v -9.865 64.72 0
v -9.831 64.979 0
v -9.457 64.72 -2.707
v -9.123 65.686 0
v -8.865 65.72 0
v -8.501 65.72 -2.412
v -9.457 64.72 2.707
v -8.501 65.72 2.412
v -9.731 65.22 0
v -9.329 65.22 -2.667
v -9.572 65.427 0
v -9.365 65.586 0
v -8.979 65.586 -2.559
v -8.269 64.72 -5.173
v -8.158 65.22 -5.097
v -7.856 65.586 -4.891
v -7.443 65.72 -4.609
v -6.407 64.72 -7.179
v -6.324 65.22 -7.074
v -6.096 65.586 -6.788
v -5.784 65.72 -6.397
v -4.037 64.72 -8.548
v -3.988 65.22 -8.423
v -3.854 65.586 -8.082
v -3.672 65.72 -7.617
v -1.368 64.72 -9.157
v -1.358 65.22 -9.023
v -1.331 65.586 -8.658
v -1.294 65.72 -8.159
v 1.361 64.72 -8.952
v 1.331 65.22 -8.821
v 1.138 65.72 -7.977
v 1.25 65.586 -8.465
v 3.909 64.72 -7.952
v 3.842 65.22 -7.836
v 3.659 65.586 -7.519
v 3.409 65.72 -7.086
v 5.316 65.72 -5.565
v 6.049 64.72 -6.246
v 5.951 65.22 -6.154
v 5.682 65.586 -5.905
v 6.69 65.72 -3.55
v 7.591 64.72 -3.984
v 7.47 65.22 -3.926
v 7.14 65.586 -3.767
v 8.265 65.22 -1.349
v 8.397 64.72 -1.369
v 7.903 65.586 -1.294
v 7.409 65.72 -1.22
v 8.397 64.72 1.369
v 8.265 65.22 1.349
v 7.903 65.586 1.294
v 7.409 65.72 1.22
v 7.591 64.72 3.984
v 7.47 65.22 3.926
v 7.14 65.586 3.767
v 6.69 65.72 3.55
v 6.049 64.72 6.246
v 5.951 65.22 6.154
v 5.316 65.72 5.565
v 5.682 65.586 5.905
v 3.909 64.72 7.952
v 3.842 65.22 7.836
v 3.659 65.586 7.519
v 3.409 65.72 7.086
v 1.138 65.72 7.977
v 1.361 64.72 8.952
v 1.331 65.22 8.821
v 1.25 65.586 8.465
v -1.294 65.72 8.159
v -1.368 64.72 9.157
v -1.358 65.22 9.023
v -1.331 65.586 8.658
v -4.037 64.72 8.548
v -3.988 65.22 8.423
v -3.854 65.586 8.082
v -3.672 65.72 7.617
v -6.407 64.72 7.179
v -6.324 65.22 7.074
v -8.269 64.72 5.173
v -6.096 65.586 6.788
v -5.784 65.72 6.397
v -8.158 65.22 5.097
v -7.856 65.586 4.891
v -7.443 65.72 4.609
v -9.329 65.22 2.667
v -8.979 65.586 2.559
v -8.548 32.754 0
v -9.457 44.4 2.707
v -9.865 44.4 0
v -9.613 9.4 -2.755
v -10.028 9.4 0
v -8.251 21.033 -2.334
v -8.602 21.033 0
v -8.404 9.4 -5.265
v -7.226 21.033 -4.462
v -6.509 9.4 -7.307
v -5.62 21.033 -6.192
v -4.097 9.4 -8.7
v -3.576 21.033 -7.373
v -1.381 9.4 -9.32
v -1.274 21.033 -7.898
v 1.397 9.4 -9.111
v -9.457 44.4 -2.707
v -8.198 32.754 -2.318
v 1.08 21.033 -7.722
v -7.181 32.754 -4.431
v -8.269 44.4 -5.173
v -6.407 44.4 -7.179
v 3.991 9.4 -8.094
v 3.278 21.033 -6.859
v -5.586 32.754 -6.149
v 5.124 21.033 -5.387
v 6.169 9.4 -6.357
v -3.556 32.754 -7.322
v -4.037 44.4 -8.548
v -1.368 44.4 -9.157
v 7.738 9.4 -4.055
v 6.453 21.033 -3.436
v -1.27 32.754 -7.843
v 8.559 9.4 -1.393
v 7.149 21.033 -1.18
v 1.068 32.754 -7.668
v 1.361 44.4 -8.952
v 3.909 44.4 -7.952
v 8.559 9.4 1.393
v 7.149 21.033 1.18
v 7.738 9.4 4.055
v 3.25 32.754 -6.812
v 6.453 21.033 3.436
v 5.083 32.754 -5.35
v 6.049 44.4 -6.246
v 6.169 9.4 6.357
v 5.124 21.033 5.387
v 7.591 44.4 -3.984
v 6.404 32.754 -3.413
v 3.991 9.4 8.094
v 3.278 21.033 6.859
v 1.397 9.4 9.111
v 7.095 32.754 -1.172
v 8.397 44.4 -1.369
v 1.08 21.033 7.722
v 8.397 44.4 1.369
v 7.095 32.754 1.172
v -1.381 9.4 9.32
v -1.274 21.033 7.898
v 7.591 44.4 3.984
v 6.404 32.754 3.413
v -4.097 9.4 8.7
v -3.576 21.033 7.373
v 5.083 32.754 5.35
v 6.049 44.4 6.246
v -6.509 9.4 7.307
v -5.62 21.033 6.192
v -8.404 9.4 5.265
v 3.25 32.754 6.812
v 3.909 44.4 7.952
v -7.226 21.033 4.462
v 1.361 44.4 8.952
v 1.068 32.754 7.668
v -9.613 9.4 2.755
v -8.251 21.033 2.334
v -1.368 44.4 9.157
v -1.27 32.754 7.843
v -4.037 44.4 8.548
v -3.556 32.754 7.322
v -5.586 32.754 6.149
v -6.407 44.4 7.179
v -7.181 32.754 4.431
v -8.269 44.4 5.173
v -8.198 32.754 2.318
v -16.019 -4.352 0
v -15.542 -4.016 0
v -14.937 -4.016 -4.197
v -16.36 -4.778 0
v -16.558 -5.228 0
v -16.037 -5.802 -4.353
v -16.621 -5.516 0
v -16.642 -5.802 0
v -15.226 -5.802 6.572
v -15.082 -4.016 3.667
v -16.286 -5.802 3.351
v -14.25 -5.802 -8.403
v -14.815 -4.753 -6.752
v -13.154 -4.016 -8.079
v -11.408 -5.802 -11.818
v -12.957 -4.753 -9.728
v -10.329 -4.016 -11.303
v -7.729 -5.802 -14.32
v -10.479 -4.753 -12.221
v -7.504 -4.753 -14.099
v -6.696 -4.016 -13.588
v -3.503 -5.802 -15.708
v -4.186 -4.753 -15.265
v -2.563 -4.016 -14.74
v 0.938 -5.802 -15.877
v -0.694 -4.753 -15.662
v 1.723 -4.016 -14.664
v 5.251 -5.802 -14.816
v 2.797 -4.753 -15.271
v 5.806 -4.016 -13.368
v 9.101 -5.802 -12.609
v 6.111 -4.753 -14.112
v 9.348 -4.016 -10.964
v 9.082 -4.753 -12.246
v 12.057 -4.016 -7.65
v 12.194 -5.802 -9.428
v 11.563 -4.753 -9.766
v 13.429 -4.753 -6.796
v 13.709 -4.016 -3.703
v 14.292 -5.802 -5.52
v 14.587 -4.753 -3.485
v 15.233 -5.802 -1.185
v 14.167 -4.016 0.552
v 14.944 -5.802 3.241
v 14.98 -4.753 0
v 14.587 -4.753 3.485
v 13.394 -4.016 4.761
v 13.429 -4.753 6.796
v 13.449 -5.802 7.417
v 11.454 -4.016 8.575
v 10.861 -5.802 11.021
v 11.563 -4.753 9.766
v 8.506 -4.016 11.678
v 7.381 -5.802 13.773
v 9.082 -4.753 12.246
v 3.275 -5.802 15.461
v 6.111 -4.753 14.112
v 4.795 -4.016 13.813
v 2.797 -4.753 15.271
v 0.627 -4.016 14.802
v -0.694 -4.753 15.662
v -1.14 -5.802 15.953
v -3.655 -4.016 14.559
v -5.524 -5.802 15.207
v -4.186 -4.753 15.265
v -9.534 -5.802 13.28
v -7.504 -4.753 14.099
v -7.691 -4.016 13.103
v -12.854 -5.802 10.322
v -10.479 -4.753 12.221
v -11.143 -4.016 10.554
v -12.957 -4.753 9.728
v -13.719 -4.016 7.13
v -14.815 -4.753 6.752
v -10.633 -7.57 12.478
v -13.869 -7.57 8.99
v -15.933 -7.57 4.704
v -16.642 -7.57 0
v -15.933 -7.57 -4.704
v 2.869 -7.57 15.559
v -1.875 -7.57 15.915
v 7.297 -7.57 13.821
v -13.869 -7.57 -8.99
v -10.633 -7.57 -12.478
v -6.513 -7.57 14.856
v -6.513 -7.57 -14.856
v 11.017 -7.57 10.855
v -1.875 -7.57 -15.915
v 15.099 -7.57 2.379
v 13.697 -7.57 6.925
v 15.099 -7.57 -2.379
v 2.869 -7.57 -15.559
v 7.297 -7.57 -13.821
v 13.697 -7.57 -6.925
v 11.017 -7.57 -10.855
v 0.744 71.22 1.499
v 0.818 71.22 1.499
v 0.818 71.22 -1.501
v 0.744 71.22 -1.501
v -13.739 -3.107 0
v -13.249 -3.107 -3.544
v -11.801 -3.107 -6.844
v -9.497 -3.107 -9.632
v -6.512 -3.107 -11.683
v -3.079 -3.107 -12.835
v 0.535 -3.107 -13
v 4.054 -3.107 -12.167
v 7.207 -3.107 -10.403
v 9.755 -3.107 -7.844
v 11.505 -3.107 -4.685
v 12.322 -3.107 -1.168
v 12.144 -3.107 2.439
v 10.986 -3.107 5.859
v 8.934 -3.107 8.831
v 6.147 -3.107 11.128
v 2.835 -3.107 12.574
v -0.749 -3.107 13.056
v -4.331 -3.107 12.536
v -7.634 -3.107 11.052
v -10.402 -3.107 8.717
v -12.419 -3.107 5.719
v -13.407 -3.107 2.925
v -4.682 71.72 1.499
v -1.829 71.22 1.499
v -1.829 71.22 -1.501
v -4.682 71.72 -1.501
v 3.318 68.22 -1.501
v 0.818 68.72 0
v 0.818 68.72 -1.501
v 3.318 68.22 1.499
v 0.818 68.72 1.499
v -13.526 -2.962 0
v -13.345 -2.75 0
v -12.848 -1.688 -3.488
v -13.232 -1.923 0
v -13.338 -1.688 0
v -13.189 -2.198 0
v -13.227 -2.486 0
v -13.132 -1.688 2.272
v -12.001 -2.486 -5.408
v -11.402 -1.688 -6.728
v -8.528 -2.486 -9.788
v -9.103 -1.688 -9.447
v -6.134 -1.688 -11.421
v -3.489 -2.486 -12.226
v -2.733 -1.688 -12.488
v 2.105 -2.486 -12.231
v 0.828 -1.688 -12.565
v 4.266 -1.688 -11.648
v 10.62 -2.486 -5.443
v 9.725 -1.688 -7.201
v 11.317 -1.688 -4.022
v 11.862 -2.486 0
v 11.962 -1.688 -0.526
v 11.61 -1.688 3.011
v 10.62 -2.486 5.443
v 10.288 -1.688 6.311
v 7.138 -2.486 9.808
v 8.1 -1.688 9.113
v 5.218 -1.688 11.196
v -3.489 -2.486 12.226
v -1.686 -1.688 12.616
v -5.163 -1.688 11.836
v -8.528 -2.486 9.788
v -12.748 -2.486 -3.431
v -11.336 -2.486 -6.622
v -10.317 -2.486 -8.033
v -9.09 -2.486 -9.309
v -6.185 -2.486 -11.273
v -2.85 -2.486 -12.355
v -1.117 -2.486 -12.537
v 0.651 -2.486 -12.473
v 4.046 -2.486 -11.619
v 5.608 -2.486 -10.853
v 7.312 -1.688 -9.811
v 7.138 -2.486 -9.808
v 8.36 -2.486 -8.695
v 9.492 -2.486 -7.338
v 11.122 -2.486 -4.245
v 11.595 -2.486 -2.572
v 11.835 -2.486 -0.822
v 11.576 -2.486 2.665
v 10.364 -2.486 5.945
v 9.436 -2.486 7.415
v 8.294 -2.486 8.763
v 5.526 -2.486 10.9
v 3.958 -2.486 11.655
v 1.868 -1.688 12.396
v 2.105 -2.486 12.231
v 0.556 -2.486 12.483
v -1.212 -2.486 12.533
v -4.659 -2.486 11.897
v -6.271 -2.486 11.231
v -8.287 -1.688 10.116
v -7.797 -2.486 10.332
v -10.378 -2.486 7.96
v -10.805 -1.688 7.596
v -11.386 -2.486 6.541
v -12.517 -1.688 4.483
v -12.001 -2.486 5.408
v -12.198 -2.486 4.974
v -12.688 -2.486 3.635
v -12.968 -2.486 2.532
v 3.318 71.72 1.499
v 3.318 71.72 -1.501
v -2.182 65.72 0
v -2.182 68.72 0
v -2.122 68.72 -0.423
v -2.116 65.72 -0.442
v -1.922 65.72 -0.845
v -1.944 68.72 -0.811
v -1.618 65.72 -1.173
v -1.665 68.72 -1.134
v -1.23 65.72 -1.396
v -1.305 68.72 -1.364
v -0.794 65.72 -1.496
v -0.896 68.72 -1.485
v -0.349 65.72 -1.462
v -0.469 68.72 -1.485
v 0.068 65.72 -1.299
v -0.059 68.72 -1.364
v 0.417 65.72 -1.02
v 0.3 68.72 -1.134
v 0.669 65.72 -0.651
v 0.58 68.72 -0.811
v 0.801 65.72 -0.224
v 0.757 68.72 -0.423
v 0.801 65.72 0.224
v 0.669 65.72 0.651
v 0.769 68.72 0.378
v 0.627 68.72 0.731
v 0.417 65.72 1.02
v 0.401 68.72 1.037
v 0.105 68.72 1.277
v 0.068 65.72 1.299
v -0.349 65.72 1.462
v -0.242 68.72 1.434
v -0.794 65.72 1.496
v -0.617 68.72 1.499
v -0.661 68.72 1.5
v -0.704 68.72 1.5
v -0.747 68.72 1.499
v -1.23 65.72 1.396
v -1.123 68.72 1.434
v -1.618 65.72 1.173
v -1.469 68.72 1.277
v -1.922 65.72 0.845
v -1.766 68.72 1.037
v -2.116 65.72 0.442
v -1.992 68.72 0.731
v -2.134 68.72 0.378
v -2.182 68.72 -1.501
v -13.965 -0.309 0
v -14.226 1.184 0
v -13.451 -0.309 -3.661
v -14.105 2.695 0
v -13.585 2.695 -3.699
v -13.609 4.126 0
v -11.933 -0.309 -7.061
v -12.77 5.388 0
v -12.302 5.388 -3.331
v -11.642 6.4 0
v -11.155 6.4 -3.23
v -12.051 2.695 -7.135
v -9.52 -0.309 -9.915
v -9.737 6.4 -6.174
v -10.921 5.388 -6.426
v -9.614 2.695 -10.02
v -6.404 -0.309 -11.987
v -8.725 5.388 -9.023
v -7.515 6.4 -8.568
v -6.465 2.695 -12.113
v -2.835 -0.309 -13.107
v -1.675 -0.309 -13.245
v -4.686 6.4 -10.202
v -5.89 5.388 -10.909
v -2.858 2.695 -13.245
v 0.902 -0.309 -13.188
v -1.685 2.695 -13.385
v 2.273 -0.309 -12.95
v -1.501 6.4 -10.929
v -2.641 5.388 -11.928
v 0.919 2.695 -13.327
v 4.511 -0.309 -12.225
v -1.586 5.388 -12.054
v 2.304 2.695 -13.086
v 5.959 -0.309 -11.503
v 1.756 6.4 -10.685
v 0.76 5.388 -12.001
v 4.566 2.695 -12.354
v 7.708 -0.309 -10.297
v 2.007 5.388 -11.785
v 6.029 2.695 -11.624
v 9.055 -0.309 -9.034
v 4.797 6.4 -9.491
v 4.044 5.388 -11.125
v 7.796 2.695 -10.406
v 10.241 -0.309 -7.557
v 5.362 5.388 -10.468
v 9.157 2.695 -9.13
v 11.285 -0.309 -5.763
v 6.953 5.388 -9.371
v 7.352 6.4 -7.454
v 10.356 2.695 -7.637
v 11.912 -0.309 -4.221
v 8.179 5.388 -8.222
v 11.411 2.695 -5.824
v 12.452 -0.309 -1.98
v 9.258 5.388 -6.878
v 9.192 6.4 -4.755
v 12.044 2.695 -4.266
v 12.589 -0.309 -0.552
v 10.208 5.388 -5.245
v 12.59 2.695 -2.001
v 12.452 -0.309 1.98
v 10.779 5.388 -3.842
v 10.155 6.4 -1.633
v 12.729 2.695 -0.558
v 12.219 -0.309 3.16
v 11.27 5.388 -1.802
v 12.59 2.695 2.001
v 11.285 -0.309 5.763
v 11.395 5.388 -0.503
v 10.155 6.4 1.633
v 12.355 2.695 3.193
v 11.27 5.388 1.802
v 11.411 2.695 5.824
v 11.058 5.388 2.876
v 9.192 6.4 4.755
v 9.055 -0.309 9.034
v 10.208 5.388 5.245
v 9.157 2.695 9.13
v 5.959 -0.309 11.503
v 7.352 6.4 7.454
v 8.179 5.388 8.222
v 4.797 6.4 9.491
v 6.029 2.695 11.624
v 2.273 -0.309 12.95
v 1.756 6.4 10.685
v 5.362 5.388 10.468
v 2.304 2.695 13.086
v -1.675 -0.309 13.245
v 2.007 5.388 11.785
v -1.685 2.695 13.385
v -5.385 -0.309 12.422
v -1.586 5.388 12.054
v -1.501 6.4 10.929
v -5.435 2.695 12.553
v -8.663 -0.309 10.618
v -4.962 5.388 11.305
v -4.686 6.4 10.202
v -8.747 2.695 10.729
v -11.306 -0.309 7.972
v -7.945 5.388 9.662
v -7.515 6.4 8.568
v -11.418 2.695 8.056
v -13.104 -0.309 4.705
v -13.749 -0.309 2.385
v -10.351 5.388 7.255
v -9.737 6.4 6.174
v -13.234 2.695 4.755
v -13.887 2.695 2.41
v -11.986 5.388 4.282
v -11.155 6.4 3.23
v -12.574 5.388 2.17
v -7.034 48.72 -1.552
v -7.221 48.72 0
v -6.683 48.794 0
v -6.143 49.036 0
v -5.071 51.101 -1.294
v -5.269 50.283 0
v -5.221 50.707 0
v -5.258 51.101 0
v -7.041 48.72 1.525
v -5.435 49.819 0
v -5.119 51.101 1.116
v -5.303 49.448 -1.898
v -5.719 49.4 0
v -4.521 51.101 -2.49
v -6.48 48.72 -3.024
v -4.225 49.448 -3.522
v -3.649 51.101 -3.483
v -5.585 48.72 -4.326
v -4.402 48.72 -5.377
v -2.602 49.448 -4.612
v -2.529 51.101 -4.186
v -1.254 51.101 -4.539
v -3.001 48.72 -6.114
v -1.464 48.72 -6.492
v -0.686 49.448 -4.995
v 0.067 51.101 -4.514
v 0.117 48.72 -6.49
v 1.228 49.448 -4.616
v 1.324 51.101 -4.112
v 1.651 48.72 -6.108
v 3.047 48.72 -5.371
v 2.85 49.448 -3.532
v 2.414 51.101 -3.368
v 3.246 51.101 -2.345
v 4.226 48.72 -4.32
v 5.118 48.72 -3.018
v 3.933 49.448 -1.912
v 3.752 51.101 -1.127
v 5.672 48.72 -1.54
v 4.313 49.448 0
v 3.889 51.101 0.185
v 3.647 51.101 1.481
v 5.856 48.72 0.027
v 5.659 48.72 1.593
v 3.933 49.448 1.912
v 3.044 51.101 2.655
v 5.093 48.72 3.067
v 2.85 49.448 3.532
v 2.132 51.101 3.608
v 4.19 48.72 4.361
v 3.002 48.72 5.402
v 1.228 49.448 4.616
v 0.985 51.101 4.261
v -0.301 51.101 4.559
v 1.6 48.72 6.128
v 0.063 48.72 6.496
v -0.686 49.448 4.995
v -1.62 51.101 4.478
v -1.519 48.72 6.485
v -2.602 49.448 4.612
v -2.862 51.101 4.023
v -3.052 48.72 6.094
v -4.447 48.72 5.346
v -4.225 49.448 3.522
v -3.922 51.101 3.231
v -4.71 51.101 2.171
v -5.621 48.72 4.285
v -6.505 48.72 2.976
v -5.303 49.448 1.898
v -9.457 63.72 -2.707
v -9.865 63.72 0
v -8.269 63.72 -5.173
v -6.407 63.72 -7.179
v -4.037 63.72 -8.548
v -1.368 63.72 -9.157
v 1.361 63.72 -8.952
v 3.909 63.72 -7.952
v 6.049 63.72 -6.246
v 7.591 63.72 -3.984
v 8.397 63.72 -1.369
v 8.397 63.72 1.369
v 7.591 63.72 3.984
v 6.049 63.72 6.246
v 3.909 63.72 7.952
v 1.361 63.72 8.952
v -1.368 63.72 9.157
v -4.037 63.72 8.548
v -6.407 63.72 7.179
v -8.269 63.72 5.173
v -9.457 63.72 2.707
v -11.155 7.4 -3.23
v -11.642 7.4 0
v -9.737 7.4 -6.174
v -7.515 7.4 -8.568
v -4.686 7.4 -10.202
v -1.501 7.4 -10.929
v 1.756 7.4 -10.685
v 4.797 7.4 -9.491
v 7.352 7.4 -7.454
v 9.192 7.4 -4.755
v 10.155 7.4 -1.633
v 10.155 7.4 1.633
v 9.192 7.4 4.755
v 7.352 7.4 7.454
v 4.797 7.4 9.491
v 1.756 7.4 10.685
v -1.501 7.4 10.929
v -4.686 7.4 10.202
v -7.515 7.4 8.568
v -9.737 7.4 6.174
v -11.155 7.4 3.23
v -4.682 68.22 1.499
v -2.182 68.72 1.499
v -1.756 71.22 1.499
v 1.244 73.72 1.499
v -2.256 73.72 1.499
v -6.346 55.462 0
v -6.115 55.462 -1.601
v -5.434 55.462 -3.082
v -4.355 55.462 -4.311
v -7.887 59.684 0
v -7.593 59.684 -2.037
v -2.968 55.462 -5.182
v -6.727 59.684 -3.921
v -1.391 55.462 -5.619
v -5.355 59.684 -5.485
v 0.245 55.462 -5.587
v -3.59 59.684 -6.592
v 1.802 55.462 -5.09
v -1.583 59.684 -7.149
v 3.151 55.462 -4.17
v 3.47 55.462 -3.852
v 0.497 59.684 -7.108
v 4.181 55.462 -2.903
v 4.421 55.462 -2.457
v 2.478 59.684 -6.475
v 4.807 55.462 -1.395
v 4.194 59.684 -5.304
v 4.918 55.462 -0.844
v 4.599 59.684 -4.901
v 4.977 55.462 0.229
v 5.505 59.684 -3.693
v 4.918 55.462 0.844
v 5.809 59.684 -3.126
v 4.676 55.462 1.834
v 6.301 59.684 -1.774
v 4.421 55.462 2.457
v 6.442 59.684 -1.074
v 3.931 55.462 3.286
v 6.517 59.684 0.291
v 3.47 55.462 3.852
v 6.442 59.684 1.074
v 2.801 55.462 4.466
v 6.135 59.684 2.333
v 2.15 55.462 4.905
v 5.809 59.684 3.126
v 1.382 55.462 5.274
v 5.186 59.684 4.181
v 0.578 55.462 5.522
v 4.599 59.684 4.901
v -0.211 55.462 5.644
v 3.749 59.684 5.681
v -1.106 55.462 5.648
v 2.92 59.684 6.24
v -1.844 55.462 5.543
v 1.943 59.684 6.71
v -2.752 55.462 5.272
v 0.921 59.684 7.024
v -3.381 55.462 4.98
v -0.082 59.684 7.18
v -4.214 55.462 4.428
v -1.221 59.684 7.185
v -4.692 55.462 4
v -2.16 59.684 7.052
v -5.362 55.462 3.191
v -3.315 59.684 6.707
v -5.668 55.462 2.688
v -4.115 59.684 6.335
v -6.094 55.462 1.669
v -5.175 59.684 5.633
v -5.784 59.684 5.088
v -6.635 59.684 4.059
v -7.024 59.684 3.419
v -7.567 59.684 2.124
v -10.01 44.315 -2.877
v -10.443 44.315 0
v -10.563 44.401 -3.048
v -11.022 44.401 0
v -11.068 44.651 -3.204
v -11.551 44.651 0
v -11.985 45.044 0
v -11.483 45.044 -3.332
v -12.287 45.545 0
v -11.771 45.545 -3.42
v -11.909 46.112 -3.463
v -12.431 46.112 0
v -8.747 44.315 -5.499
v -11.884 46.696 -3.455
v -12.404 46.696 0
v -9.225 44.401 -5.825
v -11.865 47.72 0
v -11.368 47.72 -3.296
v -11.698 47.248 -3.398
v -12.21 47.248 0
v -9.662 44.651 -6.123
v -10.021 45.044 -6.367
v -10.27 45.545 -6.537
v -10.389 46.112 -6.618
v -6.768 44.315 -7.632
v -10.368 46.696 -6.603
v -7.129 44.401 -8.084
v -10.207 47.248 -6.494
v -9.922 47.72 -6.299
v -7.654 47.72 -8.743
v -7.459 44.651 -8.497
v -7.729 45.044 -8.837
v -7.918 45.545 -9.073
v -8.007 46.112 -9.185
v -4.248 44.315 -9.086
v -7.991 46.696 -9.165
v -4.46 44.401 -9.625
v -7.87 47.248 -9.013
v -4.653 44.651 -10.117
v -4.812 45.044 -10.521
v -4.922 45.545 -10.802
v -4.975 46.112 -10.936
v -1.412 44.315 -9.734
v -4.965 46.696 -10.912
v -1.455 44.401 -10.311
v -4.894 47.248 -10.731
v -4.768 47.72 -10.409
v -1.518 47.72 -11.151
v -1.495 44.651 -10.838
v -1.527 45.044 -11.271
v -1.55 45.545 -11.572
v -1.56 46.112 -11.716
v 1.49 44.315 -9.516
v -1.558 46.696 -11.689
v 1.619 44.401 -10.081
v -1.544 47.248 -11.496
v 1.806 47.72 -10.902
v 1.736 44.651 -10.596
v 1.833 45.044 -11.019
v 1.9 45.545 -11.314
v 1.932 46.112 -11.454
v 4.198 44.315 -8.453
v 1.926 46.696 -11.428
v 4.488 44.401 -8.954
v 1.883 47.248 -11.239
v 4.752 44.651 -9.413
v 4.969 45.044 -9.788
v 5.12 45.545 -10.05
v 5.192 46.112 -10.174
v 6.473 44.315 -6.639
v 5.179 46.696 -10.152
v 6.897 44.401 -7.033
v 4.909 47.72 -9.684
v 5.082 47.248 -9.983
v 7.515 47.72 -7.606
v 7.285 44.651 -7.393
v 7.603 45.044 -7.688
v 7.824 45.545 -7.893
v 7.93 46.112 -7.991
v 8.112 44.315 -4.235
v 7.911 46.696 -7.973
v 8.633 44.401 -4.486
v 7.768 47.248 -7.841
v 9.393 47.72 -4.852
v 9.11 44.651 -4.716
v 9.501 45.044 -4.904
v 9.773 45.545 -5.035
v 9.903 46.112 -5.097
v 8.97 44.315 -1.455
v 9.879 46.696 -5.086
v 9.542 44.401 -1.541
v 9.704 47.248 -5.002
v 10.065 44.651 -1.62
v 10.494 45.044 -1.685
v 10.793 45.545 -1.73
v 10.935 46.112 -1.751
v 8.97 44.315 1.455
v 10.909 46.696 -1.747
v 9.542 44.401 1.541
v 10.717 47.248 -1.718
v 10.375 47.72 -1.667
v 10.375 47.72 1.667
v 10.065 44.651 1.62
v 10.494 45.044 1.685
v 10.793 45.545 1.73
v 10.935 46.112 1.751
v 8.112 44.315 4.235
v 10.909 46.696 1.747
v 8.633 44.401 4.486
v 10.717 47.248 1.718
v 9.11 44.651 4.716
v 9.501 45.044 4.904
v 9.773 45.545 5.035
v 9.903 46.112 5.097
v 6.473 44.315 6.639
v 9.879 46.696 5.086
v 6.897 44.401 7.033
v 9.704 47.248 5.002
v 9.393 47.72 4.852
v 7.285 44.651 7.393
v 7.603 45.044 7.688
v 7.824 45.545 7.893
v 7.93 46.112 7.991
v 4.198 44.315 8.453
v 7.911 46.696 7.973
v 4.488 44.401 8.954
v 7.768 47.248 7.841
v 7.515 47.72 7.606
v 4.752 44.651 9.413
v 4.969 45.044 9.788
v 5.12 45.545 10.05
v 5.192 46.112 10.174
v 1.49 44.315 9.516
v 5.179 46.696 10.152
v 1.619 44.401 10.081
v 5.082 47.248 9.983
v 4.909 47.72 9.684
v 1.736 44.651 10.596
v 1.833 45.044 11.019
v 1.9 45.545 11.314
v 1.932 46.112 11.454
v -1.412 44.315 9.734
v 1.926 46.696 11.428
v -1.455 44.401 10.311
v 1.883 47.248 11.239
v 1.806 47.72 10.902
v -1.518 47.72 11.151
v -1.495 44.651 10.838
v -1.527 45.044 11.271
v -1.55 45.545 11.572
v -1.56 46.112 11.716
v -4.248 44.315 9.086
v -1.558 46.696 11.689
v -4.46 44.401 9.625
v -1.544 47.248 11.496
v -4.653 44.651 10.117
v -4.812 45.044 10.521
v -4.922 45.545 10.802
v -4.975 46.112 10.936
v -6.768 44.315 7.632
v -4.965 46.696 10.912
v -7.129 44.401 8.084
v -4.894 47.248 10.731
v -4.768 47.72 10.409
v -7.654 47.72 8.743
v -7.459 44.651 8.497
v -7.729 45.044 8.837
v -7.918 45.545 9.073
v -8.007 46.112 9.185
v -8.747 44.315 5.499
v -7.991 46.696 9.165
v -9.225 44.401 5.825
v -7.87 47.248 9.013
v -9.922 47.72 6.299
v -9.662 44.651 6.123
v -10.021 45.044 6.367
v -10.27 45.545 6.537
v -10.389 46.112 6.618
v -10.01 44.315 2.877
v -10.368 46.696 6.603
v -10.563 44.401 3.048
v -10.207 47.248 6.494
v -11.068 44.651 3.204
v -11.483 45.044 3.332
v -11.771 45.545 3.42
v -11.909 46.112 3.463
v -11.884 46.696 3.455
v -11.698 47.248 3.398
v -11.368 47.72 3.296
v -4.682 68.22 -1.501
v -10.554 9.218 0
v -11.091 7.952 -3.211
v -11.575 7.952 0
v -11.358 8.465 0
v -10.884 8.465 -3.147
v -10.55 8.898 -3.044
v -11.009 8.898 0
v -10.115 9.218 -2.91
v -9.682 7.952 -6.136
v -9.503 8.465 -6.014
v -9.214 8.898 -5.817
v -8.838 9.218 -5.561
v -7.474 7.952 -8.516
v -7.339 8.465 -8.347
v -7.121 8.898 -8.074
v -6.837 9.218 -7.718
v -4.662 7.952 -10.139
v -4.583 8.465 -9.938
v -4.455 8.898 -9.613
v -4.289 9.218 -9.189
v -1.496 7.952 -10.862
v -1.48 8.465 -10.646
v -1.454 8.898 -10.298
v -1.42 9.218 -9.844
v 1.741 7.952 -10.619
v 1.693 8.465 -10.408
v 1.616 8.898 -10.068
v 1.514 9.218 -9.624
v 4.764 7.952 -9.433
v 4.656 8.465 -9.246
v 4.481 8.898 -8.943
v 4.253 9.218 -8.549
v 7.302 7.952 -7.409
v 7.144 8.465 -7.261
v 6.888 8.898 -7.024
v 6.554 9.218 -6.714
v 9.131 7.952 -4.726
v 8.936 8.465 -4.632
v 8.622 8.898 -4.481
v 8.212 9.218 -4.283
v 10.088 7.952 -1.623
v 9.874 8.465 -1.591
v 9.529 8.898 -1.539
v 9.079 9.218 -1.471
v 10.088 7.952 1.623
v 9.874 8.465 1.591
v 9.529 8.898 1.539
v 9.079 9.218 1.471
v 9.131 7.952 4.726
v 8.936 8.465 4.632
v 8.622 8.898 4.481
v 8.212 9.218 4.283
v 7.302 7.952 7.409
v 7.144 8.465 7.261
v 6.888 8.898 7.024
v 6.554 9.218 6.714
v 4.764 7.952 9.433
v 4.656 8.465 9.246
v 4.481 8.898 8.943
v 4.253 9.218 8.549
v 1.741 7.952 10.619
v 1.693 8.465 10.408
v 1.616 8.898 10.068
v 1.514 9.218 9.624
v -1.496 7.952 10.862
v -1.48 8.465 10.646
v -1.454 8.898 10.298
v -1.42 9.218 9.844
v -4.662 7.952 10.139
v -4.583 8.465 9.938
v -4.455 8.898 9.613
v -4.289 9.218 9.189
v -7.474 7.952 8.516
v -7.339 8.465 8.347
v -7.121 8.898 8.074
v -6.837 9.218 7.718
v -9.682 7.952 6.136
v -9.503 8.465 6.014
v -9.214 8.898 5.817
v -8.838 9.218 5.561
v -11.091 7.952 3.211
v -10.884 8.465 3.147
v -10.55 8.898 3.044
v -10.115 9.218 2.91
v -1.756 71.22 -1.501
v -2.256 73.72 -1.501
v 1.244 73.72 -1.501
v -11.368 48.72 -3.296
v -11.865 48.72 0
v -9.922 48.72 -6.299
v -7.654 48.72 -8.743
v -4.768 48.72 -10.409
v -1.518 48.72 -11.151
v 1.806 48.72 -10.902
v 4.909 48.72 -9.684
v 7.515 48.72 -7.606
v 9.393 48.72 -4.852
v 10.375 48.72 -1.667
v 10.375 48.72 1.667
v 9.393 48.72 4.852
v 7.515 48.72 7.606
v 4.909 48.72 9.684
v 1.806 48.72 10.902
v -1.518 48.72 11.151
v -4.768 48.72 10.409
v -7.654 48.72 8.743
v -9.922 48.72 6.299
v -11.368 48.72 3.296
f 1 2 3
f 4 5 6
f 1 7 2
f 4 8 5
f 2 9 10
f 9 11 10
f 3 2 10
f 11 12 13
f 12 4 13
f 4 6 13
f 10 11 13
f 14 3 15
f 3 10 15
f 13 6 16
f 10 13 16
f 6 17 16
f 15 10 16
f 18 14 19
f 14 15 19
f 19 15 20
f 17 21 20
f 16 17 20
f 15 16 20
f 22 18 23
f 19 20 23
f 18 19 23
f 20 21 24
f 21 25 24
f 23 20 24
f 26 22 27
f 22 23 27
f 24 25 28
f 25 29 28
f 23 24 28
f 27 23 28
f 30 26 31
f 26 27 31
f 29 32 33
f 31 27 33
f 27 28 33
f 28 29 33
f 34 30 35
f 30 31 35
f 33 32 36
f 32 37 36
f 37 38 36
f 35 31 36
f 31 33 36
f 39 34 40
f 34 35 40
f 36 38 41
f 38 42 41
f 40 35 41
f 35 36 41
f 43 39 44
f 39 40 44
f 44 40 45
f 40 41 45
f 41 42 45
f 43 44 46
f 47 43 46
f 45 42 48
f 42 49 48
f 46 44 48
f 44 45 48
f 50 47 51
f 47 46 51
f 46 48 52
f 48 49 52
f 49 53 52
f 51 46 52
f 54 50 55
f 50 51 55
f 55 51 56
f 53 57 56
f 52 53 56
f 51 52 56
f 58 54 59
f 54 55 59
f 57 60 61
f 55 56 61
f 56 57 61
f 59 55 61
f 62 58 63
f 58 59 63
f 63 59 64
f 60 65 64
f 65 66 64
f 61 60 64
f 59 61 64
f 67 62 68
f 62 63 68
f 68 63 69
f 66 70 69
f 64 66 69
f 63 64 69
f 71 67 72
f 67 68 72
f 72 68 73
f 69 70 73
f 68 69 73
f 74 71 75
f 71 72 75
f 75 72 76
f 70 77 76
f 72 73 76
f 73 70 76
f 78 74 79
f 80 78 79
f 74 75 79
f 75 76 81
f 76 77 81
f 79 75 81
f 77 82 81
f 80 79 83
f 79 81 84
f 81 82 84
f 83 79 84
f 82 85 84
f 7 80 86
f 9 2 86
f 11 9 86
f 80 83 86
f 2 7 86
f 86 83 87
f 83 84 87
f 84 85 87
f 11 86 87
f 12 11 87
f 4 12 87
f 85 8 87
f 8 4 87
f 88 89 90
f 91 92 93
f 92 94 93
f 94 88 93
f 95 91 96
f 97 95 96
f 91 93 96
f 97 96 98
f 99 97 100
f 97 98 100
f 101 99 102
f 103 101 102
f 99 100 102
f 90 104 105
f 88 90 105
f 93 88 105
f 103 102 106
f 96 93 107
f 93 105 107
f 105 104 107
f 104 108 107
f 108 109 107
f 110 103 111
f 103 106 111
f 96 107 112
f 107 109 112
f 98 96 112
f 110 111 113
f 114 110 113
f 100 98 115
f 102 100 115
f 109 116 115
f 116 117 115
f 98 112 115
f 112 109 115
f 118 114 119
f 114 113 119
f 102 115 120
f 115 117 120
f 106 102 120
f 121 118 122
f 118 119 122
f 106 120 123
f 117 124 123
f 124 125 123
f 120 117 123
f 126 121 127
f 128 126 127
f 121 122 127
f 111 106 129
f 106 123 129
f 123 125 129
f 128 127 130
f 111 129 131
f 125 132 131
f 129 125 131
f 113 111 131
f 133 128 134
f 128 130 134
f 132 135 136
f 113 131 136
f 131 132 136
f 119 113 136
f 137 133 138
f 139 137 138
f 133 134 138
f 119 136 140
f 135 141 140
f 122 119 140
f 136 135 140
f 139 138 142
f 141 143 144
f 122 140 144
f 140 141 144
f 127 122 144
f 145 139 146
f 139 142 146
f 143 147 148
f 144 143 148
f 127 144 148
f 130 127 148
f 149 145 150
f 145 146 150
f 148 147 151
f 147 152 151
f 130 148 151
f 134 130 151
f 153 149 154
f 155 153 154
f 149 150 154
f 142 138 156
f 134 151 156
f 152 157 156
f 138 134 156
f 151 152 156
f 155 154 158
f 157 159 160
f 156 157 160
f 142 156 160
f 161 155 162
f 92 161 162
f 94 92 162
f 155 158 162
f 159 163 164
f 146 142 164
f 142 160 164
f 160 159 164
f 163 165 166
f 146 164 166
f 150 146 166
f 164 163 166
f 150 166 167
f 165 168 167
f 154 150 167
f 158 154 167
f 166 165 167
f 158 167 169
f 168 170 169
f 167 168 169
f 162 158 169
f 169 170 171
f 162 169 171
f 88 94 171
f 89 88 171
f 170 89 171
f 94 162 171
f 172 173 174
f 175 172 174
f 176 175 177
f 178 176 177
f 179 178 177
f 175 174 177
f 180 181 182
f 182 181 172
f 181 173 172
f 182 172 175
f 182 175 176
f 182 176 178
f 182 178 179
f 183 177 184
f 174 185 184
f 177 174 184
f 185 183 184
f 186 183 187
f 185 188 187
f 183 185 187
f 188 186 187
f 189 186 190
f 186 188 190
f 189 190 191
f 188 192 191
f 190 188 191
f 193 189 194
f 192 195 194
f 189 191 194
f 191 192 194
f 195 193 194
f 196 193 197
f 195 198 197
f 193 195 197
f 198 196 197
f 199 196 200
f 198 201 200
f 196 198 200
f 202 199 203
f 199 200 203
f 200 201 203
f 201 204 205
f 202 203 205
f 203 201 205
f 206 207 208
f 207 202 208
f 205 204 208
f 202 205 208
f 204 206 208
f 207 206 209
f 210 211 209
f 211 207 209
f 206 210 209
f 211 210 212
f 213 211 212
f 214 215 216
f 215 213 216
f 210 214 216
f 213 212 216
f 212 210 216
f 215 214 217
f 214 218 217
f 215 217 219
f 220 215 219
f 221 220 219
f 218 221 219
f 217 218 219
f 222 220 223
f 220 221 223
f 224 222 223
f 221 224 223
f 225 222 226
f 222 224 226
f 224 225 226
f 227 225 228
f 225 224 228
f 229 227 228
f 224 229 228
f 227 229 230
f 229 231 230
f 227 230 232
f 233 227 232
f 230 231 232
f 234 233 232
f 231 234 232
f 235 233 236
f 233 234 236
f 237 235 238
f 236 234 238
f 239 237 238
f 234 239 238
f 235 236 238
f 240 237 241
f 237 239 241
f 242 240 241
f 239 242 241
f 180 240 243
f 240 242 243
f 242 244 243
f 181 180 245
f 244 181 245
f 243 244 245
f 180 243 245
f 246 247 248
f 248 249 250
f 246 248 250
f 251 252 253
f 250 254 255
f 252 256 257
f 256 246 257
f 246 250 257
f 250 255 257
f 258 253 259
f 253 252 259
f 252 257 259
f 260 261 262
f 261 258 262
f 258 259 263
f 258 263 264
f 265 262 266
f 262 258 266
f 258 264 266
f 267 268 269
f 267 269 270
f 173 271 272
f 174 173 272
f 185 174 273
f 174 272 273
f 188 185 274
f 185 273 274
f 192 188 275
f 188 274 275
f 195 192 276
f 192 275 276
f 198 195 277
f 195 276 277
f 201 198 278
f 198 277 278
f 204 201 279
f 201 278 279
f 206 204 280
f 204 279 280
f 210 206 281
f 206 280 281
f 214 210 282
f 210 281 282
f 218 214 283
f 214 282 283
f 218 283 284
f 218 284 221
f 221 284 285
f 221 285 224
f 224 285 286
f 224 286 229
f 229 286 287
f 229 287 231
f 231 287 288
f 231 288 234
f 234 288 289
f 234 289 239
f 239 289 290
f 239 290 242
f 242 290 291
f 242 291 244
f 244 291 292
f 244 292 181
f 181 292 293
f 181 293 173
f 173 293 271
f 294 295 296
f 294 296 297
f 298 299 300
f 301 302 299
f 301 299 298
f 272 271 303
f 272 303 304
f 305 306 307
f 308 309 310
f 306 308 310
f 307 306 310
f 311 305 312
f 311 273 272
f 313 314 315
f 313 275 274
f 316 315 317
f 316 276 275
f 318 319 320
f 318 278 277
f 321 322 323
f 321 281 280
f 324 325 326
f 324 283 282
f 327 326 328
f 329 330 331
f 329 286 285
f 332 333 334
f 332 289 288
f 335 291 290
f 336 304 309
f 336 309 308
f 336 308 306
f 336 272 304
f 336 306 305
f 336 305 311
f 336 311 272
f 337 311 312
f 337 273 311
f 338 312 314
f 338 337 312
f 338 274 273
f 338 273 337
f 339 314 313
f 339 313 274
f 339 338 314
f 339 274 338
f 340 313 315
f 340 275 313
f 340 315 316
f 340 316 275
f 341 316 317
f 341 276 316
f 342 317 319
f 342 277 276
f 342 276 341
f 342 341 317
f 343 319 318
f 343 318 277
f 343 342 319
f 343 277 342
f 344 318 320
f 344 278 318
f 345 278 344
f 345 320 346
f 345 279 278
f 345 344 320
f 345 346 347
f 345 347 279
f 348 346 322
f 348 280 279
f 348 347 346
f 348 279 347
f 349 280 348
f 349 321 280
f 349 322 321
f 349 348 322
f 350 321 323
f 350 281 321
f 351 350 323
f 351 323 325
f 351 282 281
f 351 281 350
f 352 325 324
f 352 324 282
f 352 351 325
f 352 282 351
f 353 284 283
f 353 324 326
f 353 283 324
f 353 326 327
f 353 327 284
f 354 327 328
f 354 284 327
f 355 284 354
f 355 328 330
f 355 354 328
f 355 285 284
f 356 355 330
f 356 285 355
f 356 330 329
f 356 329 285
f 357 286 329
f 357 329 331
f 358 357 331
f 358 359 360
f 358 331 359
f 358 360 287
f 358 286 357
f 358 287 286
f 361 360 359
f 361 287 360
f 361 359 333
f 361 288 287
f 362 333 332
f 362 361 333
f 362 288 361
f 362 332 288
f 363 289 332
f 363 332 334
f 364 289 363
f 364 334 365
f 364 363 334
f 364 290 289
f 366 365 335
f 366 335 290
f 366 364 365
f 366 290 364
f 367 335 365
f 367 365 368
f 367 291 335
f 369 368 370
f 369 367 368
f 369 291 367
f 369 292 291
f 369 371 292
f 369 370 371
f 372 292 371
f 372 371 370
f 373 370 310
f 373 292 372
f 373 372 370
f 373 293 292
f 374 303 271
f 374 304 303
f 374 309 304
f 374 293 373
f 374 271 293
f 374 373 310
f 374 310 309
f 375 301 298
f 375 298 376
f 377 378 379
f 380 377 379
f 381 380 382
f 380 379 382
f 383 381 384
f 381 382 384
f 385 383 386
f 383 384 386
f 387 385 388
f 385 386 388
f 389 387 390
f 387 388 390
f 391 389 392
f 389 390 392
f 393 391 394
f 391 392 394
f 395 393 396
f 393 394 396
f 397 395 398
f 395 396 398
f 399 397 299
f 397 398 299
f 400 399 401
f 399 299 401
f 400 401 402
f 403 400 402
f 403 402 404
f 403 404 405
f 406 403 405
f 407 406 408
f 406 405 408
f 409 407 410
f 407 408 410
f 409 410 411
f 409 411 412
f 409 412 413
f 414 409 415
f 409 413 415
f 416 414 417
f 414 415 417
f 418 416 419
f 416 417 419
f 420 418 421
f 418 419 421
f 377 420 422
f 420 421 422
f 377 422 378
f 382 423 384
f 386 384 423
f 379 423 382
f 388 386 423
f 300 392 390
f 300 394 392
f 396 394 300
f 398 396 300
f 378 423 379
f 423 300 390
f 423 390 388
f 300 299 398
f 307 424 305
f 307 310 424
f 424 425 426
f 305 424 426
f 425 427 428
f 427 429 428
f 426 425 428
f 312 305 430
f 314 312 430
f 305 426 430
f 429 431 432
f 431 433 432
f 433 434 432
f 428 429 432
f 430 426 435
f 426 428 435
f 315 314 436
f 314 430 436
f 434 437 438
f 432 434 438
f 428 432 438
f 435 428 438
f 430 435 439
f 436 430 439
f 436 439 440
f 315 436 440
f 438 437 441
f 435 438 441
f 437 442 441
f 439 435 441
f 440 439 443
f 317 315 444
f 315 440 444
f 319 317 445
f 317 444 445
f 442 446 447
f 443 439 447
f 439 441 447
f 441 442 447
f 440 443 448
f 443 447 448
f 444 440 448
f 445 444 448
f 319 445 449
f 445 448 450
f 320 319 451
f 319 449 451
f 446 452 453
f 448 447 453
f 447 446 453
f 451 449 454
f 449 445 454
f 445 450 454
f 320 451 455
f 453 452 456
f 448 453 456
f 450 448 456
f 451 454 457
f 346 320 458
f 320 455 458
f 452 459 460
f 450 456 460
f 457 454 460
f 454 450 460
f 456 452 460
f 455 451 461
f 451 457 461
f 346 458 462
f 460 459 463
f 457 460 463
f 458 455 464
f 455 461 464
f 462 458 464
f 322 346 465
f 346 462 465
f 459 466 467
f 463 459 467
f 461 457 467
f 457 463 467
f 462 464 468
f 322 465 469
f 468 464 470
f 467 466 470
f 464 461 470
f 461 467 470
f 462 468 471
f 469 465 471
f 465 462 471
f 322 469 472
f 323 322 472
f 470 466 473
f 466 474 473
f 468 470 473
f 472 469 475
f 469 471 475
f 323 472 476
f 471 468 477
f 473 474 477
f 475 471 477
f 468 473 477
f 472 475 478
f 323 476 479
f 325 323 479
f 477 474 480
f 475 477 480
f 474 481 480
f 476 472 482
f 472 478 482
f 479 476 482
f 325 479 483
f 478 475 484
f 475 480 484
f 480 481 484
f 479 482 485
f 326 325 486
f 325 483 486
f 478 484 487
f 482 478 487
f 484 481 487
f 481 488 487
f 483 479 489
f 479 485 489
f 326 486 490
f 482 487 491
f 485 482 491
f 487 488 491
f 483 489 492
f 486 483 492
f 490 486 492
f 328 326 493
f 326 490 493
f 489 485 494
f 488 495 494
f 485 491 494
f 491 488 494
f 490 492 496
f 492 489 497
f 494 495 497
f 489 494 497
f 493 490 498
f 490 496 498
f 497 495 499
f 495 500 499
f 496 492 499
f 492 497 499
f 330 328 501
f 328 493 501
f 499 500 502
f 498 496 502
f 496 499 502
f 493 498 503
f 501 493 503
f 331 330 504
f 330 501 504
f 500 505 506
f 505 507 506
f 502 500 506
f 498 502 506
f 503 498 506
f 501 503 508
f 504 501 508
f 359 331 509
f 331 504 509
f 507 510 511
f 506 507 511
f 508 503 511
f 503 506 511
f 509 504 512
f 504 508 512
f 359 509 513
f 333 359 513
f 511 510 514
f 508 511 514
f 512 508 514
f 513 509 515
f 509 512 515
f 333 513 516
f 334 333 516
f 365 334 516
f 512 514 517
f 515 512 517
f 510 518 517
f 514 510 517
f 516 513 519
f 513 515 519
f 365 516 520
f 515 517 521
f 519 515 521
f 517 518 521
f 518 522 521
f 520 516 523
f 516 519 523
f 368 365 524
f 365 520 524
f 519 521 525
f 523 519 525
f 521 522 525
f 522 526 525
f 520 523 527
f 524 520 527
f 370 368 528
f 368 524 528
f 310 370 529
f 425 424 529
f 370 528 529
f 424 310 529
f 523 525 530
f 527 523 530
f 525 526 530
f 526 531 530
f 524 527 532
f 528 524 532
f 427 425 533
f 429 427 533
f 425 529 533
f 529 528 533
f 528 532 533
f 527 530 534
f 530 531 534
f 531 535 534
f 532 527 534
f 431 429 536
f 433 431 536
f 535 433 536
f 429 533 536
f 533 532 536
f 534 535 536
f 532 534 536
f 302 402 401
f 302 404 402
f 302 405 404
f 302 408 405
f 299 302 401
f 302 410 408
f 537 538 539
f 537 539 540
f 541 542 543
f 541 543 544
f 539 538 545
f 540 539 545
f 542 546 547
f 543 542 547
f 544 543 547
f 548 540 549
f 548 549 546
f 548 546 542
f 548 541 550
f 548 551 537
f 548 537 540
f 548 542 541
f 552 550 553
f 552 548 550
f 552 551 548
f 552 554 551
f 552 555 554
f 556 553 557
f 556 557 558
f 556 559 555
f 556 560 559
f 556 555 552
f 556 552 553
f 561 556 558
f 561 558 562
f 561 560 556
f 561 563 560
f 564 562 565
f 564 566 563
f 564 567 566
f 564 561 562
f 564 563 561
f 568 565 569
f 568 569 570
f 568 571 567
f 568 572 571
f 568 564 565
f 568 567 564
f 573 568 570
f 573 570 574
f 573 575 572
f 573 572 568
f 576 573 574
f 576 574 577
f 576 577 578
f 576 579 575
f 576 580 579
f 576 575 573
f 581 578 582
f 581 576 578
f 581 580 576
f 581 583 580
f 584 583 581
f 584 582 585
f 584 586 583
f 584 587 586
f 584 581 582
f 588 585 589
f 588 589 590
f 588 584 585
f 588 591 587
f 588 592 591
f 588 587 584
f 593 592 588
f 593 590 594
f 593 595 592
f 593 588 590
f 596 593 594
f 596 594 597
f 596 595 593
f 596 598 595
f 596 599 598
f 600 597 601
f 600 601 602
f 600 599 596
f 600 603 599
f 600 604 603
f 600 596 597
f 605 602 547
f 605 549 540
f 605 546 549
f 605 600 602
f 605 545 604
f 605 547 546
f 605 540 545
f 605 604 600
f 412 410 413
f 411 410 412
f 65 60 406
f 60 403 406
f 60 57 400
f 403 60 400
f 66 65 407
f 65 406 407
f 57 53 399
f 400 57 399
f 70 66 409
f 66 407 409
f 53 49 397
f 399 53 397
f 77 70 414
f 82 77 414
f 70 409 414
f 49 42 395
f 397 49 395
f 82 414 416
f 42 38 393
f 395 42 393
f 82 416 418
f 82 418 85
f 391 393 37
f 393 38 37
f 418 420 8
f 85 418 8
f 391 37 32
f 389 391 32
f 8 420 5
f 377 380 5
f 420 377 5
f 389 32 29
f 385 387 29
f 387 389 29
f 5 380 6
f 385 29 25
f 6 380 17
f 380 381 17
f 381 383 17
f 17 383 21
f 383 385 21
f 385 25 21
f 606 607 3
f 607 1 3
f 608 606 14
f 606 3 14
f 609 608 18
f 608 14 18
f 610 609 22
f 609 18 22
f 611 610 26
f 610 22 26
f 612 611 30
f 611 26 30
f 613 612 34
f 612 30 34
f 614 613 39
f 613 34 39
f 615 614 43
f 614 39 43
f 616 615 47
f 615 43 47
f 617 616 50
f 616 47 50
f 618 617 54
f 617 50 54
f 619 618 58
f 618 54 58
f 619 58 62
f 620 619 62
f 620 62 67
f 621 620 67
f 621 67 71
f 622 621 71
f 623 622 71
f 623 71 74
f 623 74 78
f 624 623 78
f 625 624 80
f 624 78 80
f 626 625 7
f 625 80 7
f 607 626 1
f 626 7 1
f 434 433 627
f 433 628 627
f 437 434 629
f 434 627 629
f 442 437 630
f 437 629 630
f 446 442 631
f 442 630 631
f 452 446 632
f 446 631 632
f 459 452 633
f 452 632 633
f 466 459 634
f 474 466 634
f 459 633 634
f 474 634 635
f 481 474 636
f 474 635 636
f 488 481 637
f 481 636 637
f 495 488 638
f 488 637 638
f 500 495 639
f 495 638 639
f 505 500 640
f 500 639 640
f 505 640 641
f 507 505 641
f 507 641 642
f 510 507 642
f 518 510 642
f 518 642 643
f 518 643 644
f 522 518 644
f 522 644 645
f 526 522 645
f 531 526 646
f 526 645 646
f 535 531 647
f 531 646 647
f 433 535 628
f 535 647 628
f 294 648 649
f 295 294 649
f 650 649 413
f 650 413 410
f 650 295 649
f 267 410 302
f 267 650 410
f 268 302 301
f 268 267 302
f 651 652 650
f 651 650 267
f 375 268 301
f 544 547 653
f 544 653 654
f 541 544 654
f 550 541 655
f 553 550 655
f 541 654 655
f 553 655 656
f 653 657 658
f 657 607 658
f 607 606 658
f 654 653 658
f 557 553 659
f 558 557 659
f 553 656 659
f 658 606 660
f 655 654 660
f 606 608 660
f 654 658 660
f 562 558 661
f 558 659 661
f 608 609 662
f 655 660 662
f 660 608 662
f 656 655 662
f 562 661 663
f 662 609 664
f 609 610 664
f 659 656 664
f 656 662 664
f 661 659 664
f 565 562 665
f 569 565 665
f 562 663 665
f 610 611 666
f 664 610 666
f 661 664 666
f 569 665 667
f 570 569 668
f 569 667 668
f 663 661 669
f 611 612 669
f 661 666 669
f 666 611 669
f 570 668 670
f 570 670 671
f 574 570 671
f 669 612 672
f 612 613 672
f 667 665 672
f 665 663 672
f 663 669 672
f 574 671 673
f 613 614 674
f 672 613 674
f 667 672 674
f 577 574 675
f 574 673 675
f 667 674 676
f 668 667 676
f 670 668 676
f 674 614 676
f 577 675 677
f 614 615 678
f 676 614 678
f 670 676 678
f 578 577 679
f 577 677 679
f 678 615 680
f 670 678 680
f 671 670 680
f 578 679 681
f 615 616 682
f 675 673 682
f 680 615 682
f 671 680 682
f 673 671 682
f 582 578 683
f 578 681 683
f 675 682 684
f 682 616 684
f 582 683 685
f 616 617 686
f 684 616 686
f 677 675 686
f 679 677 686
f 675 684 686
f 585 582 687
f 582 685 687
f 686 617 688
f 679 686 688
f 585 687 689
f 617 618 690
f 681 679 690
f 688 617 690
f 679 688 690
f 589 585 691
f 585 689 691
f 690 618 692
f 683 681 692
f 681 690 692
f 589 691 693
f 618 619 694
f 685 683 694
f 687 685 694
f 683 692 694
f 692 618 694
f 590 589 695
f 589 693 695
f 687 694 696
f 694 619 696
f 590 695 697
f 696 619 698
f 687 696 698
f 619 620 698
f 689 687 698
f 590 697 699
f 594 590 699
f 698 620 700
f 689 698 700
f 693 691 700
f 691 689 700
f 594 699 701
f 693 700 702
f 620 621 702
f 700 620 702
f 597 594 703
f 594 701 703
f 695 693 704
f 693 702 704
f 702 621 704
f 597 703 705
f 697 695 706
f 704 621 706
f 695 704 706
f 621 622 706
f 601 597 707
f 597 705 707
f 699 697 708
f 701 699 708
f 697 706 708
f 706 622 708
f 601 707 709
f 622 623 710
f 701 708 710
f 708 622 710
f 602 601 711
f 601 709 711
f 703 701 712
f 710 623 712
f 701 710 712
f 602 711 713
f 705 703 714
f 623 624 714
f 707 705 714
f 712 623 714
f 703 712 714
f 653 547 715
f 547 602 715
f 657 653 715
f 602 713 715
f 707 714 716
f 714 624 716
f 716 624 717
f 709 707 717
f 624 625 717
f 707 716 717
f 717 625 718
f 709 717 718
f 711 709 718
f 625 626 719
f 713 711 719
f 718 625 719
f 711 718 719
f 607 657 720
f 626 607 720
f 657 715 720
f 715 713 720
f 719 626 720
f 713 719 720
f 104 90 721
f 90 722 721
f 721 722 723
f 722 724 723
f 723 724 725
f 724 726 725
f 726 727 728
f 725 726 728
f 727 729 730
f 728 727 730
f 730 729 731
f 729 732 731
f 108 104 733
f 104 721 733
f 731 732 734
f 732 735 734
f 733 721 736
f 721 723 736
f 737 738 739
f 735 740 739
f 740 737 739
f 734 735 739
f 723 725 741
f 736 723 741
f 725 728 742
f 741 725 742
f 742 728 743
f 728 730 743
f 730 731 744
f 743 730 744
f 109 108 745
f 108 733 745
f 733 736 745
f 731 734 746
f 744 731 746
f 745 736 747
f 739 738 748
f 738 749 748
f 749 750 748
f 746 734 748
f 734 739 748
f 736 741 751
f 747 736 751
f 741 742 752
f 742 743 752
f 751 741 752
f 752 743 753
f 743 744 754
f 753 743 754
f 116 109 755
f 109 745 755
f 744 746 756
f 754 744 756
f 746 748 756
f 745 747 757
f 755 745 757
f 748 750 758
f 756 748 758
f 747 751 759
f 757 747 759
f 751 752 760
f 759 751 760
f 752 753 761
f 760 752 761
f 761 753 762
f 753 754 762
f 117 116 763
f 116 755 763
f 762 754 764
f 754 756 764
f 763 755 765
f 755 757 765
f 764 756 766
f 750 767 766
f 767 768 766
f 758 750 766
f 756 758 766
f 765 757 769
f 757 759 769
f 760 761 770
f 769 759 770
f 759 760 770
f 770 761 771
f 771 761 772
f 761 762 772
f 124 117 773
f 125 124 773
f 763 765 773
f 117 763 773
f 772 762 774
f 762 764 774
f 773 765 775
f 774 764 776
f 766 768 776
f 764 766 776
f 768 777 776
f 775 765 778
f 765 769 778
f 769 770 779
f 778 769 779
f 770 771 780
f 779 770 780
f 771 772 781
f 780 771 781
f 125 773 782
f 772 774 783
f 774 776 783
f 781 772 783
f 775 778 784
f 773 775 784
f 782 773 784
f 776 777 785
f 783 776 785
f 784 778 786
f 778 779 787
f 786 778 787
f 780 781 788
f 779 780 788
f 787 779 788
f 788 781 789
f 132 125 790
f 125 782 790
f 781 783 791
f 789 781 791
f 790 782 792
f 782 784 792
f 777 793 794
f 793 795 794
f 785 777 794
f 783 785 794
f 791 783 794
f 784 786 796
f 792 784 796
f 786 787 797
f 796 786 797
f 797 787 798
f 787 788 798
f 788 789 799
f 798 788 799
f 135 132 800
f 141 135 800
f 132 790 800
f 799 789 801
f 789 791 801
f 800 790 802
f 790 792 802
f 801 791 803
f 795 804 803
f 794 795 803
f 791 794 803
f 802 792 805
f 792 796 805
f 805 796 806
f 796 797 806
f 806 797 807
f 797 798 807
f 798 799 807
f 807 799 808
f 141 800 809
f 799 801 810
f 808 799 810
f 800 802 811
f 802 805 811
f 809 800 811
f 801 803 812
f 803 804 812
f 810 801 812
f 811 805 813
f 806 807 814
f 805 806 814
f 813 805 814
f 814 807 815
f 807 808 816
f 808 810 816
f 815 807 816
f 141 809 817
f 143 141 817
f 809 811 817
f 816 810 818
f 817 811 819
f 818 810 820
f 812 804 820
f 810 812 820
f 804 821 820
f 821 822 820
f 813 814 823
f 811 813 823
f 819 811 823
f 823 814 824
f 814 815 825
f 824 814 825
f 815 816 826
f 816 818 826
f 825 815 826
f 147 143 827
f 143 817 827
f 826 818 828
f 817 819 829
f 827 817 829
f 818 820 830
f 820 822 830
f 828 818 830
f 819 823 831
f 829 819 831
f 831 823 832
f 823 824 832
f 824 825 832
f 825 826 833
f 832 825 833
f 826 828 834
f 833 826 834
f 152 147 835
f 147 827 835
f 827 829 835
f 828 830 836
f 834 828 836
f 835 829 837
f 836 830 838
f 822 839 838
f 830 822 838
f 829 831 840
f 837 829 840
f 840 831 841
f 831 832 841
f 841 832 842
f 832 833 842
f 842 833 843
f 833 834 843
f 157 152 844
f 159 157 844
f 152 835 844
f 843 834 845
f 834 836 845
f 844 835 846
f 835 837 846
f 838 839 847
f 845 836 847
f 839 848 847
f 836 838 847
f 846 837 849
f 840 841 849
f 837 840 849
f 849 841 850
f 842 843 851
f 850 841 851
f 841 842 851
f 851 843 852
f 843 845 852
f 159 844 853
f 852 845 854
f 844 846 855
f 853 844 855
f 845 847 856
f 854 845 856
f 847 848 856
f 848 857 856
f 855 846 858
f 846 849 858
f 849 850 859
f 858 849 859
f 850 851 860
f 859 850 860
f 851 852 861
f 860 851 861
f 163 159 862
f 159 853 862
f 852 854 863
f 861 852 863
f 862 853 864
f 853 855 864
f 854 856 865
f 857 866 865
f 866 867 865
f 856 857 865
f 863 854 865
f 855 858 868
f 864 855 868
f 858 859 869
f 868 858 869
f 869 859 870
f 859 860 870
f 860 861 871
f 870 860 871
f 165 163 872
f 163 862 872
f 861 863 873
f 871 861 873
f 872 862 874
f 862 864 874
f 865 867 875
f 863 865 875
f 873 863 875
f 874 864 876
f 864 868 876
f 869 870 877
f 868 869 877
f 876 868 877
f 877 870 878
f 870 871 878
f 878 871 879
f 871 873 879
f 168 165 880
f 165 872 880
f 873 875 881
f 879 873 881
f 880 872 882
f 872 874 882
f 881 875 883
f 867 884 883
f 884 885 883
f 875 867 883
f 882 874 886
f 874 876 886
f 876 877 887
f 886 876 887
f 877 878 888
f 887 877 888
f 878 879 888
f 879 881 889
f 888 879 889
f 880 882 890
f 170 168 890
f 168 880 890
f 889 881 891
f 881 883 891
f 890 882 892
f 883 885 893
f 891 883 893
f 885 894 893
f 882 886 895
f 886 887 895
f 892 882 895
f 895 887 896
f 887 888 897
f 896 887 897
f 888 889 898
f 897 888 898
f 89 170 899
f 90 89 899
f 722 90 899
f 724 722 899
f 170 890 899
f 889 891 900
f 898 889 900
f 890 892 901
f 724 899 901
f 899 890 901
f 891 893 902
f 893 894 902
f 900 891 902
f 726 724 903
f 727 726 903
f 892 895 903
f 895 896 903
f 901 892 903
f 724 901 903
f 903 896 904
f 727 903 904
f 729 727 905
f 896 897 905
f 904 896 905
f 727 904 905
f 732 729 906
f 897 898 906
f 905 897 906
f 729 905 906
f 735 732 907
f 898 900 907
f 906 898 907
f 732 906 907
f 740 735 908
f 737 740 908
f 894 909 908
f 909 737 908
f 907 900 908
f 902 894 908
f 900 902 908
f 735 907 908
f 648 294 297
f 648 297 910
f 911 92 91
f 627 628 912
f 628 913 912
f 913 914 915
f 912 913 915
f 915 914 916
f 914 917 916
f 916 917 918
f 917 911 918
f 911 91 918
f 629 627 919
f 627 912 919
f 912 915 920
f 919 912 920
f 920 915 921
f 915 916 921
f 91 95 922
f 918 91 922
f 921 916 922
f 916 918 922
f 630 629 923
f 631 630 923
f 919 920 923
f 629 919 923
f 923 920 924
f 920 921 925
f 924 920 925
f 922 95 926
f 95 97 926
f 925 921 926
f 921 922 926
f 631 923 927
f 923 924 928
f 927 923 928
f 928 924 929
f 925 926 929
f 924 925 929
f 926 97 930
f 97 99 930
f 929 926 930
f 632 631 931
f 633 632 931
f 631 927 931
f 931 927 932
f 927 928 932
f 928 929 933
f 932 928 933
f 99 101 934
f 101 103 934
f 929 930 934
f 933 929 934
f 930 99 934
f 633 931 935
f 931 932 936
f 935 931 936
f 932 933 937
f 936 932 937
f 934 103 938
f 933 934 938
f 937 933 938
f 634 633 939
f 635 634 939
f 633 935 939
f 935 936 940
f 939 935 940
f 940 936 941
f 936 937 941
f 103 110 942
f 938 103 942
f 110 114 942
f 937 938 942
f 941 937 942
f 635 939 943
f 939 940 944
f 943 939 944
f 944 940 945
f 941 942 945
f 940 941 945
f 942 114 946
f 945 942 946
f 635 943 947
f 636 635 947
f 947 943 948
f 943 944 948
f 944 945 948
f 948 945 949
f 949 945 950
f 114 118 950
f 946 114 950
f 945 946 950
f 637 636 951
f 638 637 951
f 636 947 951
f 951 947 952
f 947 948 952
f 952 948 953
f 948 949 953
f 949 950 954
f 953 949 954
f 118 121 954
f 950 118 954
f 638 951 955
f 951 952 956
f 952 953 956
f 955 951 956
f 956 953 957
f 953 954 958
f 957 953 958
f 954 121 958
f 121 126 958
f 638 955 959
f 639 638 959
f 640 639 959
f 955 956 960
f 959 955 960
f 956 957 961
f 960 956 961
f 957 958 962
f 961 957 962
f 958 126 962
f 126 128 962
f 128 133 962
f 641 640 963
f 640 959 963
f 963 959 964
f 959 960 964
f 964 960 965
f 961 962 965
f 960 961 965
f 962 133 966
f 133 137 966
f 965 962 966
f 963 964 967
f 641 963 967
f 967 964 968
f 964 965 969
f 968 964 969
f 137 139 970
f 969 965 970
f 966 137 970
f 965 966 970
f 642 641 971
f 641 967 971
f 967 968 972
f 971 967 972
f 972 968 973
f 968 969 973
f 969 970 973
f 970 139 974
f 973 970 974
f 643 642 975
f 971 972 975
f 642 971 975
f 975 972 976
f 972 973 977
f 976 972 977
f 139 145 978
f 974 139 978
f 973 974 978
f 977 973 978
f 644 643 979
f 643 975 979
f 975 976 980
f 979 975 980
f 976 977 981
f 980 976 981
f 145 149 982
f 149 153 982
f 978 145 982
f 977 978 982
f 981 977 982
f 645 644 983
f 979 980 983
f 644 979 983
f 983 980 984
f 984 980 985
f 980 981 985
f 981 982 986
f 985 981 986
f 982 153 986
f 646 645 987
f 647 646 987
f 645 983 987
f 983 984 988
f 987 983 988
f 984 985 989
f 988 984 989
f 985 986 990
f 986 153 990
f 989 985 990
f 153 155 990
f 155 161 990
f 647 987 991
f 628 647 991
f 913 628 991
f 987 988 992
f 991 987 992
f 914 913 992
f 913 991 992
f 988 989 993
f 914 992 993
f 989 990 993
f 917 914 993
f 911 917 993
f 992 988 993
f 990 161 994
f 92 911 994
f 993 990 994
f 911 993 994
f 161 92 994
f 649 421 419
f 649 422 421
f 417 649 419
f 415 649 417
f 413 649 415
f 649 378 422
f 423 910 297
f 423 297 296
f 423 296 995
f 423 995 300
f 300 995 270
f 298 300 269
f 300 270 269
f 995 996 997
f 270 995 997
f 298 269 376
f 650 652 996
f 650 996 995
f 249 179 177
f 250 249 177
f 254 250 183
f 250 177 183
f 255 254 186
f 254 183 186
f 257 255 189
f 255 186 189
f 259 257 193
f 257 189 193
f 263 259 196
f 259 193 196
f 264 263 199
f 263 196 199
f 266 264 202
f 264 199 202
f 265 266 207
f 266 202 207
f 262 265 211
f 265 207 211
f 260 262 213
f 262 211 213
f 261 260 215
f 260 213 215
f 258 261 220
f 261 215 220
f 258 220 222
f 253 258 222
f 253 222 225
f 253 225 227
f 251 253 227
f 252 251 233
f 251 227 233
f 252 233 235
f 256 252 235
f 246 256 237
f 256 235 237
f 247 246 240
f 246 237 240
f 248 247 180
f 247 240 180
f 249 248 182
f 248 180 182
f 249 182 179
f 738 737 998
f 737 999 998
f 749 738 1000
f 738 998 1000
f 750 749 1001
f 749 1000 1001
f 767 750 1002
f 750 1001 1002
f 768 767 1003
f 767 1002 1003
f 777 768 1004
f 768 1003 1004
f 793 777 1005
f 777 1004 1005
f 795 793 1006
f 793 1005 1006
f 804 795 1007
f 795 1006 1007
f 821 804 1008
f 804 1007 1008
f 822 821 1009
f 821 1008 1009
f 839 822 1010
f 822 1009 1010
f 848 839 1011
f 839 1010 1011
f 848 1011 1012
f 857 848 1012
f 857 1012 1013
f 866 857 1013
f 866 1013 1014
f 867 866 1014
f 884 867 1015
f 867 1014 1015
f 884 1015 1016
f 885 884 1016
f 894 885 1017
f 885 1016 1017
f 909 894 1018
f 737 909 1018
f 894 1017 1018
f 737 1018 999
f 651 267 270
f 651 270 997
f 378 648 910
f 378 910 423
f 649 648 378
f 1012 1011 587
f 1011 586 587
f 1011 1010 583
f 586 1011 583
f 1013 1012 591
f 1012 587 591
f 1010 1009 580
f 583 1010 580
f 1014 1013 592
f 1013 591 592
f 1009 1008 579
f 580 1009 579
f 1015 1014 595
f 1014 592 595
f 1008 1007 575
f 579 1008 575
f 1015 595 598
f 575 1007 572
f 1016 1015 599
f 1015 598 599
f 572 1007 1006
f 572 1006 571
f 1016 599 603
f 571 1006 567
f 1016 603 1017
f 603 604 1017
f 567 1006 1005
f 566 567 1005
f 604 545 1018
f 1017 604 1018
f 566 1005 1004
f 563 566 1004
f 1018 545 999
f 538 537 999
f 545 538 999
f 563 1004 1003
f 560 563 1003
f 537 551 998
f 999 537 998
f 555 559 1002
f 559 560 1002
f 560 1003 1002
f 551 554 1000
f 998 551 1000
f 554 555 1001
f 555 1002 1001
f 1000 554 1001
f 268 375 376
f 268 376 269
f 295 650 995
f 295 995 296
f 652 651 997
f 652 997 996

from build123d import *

# Parameters (mm, degrees)
BOSS_EXTRUDE1_DEPTH = 3
FILLET1_R           = 2
FILLET2_R           = 1
FILLET3_R           = 2


with BuildPart() as part:
    # Sketch3 → Revolve1 (revolve)
    with BuildSketch(Plane.XY, mode=Mode.PRIVATE) as revolve1_sk:
        with BuildLine():
            Line((-0.682303149, 68.72), (-0.682303149, -7.57))
            Line((-0.682303149, -7.57), (13.277108949, -7.57))
            Line((13.277108949, -7.57), (15.277108949, -7.57))
            Line((15.277108949, -7.57), (15.277108949, -4.57))
            Line((15.277108949, -4.57), (11.30968923, -2.57))
            ThreePointArc((11.30968923, -2.57), (12.828597915, 2.149281625), (10.277108949, 6.4))
            Line((10.277108949, 6.4), (10.277108949, 7.4))
            ThreePointArc((10.277108949, 7.4), (9.834014283, 8.693451807), (8.663484441, 9.4))
            ThreePointArc((8.663484441, 9.4), (7.03856846, 26.89279186), (8.5, 44.4))
            ThreePointArc((8.5, 44.4), (10.789695479, 45.283075013), (10.5, 47.72))
            Line((10.5, 47.72), (10.5, 48.72))
            Line((10.5, 48.72), (3.5, 48.72))
            ThreePointArc((3.5, 48.72), (5.298648693, 56.453783769), (8.5, 63.72))
            Line((8.5, 63.72), (8.5, 64.72))
            ThreePointArc((8.5, 64.72), (8.207106781, 65.427106781), (7.5, 65.72))
            Line((7.5, 65.72), (0.817696851, 65.72))
            Line((0.817696851, 65.72), (0.817696851, 68.72))
            Line((0.817696851, 68.72), (-0.682303149, 68.72))
        make_face()
    revolve(revolve1_sk.sketch.rotate(Axis((-0.682303149, 68.72, 0), (0, -1, 0)), 180), axis=Axis((-0.682303149, 68.72, 0), (0, -1, 0)))

    # Sketch4 → Boss-Extrude1 (add)
    with BuildSketch(Plane.XY.offset(1.498594167)):
        Polygon((3.317696851, 71.72), (0.817696851, 71.22), (0.74445139, 71.22), (1.24445139, 73.72), (-2.25554861, 73.72), (-1.75554861, 71.22), (-1.828794072, 71.22), (-4.682303149, 71.72), (-4.682303149, 68.22), (-2.182303149, 68.72), (0.817696851, 68.72), (3.317696851, 68.22), align=None)
    extrude(amount=-BOSS_EXTRUDE1_DEPTH)

    # Fillet1
    fillet1_edges = [part.edges().sort_by_distance(p)[0] for p in [
        (15.277108949, -4.57, 0),
    ]]
    fillet(fillet1_edges, radius=FILLET1_R)

    # Fillet2
    fillet2_edges = [part.edges().sort_by_distance(p)[0] for p in [
        (11.30968923, -2.57, 0),
    ]]
    fillet(fillet2_edges, radius=FILLET2_R)

    # Fillet3
    fillet3_edges = [part.edges().sort_by_distance(p)[0] for p in [
        (3.5, 48.72, 0),
    ]]
    fillet(fillet3_edges, radius=FILLET3_R)


solid = part.part
